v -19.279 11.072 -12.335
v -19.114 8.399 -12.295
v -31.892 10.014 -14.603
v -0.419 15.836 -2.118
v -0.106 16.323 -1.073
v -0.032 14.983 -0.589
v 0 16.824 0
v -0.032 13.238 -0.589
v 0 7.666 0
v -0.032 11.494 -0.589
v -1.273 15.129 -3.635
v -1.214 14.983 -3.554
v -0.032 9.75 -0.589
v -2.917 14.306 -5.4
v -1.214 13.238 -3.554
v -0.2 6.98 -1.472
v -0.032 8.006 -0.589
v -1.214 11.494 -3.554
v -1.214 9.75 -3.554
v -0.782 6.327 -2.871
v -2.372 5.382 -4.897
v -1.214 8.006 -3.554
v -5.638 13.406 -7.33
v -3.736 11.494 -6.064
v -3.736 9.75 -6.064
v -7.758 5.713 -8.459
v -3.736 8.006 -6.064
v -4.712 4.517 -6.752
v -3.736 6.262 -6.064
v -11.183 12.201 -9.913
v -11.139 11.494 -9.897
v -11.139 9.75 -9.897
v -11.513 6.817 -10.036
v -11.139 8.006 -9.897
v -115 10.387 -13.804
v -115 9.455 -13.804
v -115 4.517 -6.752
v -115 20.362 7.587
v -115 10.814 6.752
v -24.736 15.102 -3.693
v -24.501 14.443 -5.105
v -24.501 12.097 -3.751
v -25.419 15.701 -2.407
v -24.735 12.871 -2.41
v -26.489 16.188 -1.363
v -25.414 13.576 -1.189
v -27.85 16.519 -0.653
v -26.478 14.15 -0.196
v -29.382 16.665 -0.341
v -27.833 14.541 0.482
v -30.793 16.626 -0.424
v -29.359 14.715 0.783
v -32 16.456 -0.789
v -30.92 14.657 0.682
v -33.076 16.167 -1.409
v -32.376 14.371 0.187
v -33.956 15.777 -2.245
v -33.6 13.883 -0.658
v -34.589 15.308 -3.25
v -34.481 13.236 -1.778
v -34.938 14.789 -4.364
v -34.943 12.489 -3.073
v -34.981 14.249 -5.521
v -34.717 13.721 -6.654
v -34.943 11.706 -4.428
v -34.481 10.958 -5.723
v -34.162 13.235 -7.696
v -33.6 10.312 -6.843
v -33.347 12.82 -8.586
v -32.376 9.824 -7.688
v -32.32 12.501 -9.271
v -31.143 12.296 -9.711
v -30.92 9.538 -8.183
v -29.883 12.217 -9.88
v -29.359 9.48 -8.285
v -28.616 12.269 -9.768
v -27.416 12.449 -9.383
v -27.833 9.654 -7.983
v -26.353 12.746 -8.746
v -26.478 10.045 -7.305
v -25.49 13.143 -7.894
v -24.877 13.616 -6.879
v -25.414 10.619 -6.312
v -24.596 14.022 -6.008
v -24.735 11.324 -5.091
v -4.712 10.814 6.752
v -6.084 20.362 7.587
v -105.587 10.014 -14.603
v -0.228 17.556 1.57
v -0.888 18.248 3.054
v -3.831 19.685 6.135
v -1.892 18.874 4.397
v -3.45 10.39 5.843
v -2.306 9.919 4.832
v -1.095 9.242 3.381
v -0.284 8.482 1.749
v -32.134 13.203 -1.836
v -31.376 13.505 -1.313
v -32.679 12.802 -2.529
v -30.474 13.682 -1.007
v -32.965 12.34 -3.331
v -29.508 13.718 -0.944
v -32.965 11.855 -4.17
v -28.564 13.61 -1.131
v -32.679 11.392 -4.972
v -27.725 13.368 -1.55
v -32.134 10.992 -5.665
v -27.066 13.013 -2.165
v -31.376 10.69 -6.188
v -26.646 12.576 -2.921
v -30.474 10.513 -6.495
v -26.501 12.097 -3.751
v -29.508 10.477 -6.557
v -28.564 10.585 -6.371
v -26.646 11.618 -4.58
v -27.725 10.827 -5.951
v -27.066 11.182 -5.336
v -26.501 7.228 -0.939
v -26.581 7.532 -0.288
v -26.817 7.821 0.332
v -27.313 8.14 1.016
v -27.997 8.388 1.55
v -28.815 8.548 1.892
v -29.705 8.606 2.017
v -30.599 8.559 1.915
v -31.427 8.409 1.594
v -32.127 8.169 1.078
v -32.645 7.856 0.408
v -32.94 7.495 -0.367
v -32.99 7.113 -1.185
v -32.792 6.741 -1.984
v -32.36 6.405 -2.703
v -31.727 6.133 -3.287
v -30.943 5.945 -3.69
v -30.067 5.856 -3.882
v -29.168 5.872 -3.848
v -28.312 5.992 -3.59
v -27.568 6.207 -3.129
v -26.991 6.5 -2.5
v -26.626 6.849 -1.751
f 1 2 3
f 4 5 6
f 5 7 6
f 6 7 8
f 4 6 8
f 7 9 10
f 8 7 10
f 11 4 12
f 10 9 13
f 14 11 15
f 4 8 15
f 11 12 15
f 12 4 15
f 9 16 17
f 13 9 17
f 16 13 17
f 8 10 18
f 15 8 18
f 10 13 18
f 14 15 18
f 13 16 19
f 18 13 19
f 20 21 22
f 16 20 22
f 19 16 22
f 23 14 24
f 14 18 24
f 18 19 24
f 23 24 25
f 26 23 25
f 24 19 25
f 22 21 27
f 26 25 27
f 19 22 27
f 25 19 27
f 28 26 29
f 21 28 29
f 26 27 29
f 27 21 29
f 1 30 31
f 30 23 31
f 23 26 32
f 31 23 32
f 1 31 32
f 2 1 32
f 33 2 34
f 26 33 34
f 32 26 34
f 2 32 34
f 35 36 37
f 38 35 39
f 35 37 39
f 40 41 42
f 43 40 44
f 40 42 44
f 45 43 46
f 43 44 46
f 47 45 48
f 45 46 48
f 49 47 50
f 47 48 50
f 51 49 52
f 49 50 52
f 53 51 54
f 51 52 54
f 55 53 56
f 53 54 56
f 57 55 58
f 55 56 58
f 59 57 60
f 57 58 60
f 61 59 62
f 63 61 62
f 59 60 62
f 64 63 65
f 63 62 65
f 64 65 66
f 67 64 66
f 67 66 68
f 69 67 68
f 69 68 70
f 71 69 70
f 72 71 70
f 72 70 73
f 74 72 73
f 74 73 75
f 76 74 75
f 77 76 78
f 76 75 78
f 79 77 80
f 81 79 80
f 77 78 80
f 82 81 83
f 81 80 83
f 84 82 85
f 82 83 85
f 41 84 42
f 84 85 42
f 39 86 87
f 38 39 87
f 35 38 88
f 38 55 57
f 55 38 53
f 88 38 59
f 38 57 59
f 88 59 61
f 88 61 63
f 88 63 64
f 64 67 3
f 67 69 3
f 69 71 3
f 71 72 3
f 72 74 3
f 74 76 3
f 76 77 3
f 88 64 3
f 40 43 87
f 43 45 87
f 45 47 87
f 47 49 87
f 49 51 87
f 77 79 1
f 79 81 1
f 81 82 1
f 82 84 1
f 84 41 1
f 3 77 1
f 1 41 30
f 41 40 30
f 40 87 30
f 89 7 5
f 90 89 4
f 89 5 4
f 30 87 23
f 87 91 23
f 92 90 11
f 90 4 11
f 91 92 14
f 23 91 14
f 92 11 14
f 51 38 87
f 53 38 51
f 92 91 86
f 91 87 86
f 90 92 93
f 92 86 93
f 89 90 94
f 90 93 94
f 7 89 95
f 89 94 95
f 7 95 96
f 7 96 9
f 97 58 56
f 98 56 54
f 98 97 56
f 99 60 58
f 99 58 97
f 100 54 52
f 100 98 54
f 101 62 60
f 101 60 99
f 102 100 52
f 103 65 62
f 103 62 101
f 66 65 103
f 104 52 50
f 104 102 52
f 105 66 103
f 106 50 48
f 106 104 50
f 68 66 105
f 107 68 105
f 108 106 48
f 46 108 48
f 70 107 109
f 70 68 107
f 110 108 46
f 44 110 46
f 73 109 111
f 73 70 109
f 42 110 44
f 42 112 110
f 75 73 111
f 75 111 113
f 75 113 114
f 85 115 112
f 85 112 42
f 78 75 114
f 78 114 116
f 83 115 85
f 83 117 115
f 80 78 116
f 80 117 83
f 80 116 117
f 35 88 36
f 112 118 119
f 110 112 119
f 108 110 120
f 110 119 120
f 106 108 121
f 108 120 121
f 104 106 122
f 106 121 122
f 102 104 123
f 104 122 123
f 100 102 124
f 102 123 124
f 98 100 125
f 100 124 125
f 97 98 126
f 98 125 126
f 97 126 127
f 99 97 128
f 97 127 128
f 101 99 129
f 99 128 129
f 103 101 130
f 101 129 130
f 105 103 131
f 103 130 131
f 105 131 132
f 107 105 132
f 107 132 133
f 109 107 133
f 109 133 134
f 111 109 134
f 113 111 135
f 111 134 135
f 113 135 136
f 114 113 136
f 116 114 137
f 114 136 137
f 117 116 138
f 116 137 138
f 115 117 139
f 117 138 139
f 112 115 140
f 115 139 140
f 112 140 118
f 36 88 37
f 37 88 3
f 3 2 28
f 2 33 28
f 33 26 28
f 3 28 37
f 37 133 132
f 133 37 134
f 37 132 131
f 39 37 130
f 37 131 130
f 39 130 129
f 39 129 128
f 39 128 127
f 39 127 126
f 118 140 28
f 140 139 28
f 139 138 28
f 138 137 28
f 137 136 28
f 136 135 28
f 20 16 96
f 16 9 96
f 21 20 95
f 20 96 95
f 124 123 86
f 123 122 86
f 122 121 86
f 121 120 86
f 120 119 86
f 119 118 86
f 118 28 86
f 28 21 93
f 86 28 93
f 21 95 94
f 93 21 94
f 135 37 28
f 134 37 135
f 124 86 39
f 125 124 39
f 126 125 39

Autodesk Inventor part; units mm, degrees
sketch "Sketch5" plane through (0, 0, 0) normal (0, 1, 0) x (-1, 0, 0)
  spline S0 degree 4 poles (214, 0.3449) (213.9235, 0.3586) (213.5504, 0.4255) (212.9247, 0.5375) (211.8694, 0.7251) (210.7617, 0.9209) (209.4043, 1.1592) (207.8102, 1.4368) (205.9789, 1.7525) (203.9169, 2.1042) (201.6282, 2.4897) (199.1185, 2.907) (196.3936, 3.3535) (193.4599, 3.8269) (190.3242, 4.3245) (186.9939, 4.8439) (183.4768, 5.3823) (179.781, 5.937) (175.9152, 6.5054) (171.8885, 7.0847) (167.7102, 7.6721) (163.3902, 8.265) (158.9384, 8.8603) (154.3653, 9.4553) (149.6816, 10.047) (144.8982, 10.6323) (140.0263, 11.2083) (135.0773, 11.7717) (130.0627, 12.3193) (124.9942, 12.8478) (119.8837, 13.3538) (114.7431, 13.8337) (109.5844, 14.2841) (104.4196, 14.7015) (99.2609, 15.0822) (94.1202, 15.4227) (89.0095, 15.7197) (83.9407, 15.9697) (78.9258, 16.1695) (73.9764, 16.3162) (69.104, 16.4071) (64.32, 16.4396) (59.6357, 16.4118) (55.0618, 16.3218) (50.6091, 16.1683) (46.288, 15.9504) (42.1085, 15.6678) (38.0804, 15.3204) (34.213, 14.9088) (30.5154, 14.4338) (26.9962, 13.8969) (23.6634, 13.3) (20.5248, 12.6451) (17.5876, 11.9348) (14.8584, 11.1717) (12.3433, 10.3589) (10.0479, 9.4991) (7.977, 8.5956) (6.1348, 7.651) (4.5247, 6.6676) (3.1496, 5.6471) (2.0123, 4.5896) (1.1163, 3.495) (0.468, 2.3618) (0.0758, 1.1958) (-0.0534, 0) (0.0758, -1.1958) (0.468, -2.3618) (1.1163, -3.495) (2.0123, -4.5896) (3.1496, -5.6471) (4.5247, -6.6676) (6.1348, -7.651) (7.977, -8.5956) (10.0479, -9.4991) (12.3433, -10.3589) (14.8584, -11.1717) (17.5876, -11.9348) (20.5248, -12.6451) (23.6634, -13.3) (26.9962, -13.8969) (30.5154, -14.4338) (34.213, -14.9088) (38.0804, -15.3204) (42.1085, -15.6678) (46.288, -15.9504) (50.6091, -16.1683) (55.0618, -16.3218) (59.6357, -16.4118) (64.32, -16.4396) (69.104, -16.4071) (73.9764, -16.3162) (78.9258, -16.1695) (83.9407, -15.9697) (89.0095, -15.7197) (94.1202, -15.4227) (99.2609, -15.0822) (104.4196, -14.7015) (109.5844, -14.2841) (114.7431, -13.8337) (119.8837, -13.3538) (124.9942, -12.8478) (130.0627, -12.3193) (135.0773, -11.7717) (140.0263, -11.2083) (144.8982, -10.6323) (149.6816, -10.047) (154.3653, -9.4553) (158.9384, -8.8603) (163.3902, -8.265) (167.7102, -7.6721) (171.8885, -7.0847) (175.9152, -6.5054) (179.781, -5.937) (183.4768, -5.3823) (186.9939, -4.8439) (190.3242, -4.3245) (193.4599, -3.8269) (196.3936, -3.3535) (199.1185, -2.907) (201.6282, -2.4897) (203.9169, -2.1042) (205.9789, -1.7525) (207.8102, -1.4368) (209.4043, -1.1592) (210.7617, -0.9209) (211.8694, -0.7251) (212.9247, -0.5375) (213.5504, -0.4255) (213.9235, -0.3586) (214, -0.3449) knots 0 0 0 0 0 0.006275 0.009968 0.014263 0.019074 0.024344 0.030027 0.036088 0.042498 0.04923 0.056263 0.063574 0.071147 0.078961 0.087003 0.095255 0.103702 0.112331 0.121128 0.130079 0.13917 0.148391 0.157726 0.167166 0.176696 0.186306 0.195983 0.205715 0.215491 0.225299 0.235127 0.244964 0.254798 0.264619 0.274414 0.284172 0.293881 0.303532 0.313111 0.322608 0.332012 0.34131 0.350493 0.359549 0.368466 0.377233 0.385838 0.39427 0.402518 0.410569 0.418411 0.426034 0.433424 0.440569 0.447459 0.454083 0.460432 0.466498 0.472281 0.477786 0.483031 0.48805 0.4929 0.497646 0.502354 0.5071 0.51195 0.516969 0.522214 0.527719 0.533502 0.539568 0.545917 0.552541 0.559431 0.566576 0.573966 0.581589 0.589431 0.597482 0.60573 0.614162 0.622767 0.631534 0.640451 0.649507 0.65869 0.667988 0.677392 0.686889 0.696468 0.706119 0.715828 0.725586 0.735381 0.745202 0.755036 0.764873 0.774701 0.784509 0.794285 0.804017 0.813694 0.823304 0.832834 0.842274 0.851609 0.86083 0.869921 0.878872 0.887669 0.896298 0.904745 0.912997 0.921039 0.928853 0.936426 0.943737 0.95077 0.957502 0.963912 0.969973 0.975656 0.980926 0.985737 0.990032 0.993725 1 1 1 1 1
  line L0 (204.525, -2) -> (204.525, 2)
  line L1 (204.525, 0) -> (0, 0)
  line L2 (0, 0) -> (61.2, 0)
  line L3 (61.2, 0) -> (61.2, -16.415)
  line L4 (61.2, -16.415) -> (61.2, 16.415)
  point P0 (0, 0)
  point P1 (213.875, 0.3673)
  point P2 (213.5005, 0.4344)
  point P3 (212.8772, 0.5457)
  point P4 (212.0066, 0.7006)
  point P5 (210.8908, 0.8979)
  point P6 (209.5323, 1.1364)
  point P7 (207.9344, 1.4146)
  point P8 (206.1007, 1.7309)
  point P9 (204.0356, 2.0831)
  point P10 (201.7438, 2.4693)
  point P11 (199.2308, 2.8872)
  point P12 (196.5023, 3.3344)
  point P13 (193.5648, 3.8084)
  point P14 (190.4252, 4.3068)
  point P15 (187.0907, 4.8269)
  point P16 (183.5691, 5.366)
  point P17 (179.8687, 5.9215)
  point P18 (175.9981, 6.4907)
  point P19 (171.9664, 7.0708)
  point P20 (167.7829, 7.6591)
  point P21 (163.4575, 8.2526)
  point P22 (159.0002, 8.8488)
  point P23 (154.4215, 9.4444)
  point P24 (149.732, 10.0368)
  point P25 (144.9427, 10.6228)
  point P26 (140.0648, 11.1993)
  point P27 (135.1097, 11.7633)
  point P28 (130.0889, 12.3114)
  point P29 (125.0142, 12.8402)
  point P30 (119.8974, 13.3464)
  point P31 (114.7505, 13.8266)
  point P32 (109.5855, 14.2771)
  point P33 (104.4145, 14.6943)
  point P34 (99.2495, 15.0749)
  point P35 (94.1026, 15.4151)
  point P36 (88.9858, 15.7116)
  point P37 (83.9111, 15.961)
  point P38 (78.8903, 16.1601)
  point P39 (73.9352, 16.306)
  point P40 (69.0573, 16.3958)
  point P41 (64.268, 16.4271)
  point P42 (59.5785, 16.3978)
  point P43 (54.9998, 16.3062)
  point P44 (50.5425, 16.1509)
  point P45 (46.2171, 15.931)
  point P46 (42.0336, 15.6461)
  point P47 (38.0019, 15.2962)
  point P48 (34.1313, 14.8818)
  point P49 (30.4309, 14.4038)
  point P50 (26.9093, 13.8636)
  point P51 (23.5748, 13.2629)
  point P52 (20.4352, 12.6039)
  point P53 (17.4977, 11.889)
  point P54 (14.7693, 11.1209)
  point P55 (12.2562, 10.3027)
  point P56 (9.9644, 9.4372)
  point P57 (7.8993, 8.5276)
  point P58 (6.0656, 7.5769)
  point P59 (4.4677, 6.5883)
  point P60 (3.1092, 5.5644)
  point P61 (1.9934, 4.5081)
  point P62 (1.1228, 3.4216)
  point P63 (0.4995, 2.307)
  point P64 (0.125, 1.1661)
  point P65 (0.125, -1.1661)
  point P66 (0.4995, -2.307)
  point P67 (1.1228, -3.4216)
  point P68 (1.9934, -4.5081)
  point P69 (3.1092, -5.5644)
  point P70 (4.4677, -6.5883)
  point P71 (6.0656, -7.5769)
  point P72 (7.8993, -8.5276)
  point P73 (9.9644, -9.4372)
  point P74 (12.2562, -10.3027)
  point P75 (14.7693, -11.1209)
  point P76 (17.4977, -11.889)
  point P77 (20.4352, -12.6039)
  point P78 (23.5748, -13.2629)
  point P79 (26.9093, -13.8636)
  point P80 (30.4309, -14.4038)
  point P81 (34.1313, -14.8818)
  point P82 (38.0019, -15.2962)
  point P83 (42.0336, -15.6461)
  point P84 (46.2171, -15.931)
  point P85 (50.5425, -16.1509)
  point P86 (54.9998, -16.3062)
  point P87 (59.5785, -16.3978)
  point P88 (64.268, -16.4271)
  point P89 (69.0573, -16.3958)
  point P90 (73.9352, -16.306)
  point P91 (78.8903, -16.1601)
  point P92 (83.9111, -15.961)
  point P93 (88.9858, -15.7116)
  point P94 (94.1026, -15.4151)
  point P95 (99.2495, -15.0749)
  point P96 (104.4145, -14.6943)
  point P97 (109.5855, -14.2771)
  point P98 (114.7505, -13.8266)
  point P99 (119.8974, -13.3464)
  point P100 (125.0142, -12.8402)
  point P101 (130.0889, -12.3114)
  point P102 (135.1097, -11.7633)
  point P103 (140.0648, -11.1993)
  point P104 (144.9427, -10.6228)
  point P105 (149.732, -10.0368)
  point P106 (154.4215, -9.4444)
  point P107 (159.0002, -8.8488)
  point P108 (163.4575, -8.2526)
  point P109 (167.7829, -7.6591)
  point P110 (171.9664, -7.0708)
  point P111 (175.9981, -6.4907)
  point P112 (179.8687, -5.9215)
  point P113 (183.5691, -5.366)
  point P114 (187.0907, -4.8269)
  point P115 (190.4252, -4.3068)
  point P116 (193.5648, -3.8084)
  point P117 (196.5023, -3.3344)
  point P118 (199.2308, -2.8872)
  point P119 (201.7438, -2.4693)
  point P120 (204.0356, -2.0831)
  point P121 (206.1007, -1.7309)
  point P122 (207.9344, -1.4146)
  point P123 (209.5323, -1.1364)
  point P124 (210.8908, -0.8979)
  point P125 (212.0066, -0.7006)
  point P126 (212.8772, -0.5457)
  point P127 (213.5005, -0.4344)
  point P128 (213.875, -0.3673)
  dimension "d28" = 204.525
  dimension "d29" = 61.2
  dimension "d30" = 32.8299
extrude "Main Wing" add sketch "Sketch5" along normal blind 453.491
sketch "Sketch6" plane through (-204.525, 0, 2) normal (-1, 0, 0) x (0, 0, 1)
  line L0 (0, 0) -> (0, 66.548)
  line L1 (0, 453.4889) -> (0, 366.5701)
  line L2 (20, 366.5701) -> (-20, 366.5701)
  line L3 (-20, 66.548) -> (20, 66.548)
  line L4 (20, 66.548) -> (20, 366.5701)
  line L5 (-20, 366.5701) -> (-20, 66.548)
  point P0 (-2, 0)
  dimension "d31" = 66.548
  dimension "d32" = 86.9188
  dimension "d33" = 40
  dimension "d34" = 40
  dimension "d43" = 300.0221
extrude "Rectangle Elevron Gap" cut sketch "Sketch6" against normal blind 69.6214
sketch "Sketch7" plane through (-204.525, 66.548, 2) normal (0, 1, 0) x (1, 0, 0)
  line L0 (69.6201, 13.7865) -> (69.6201, -9.7851)
  line L1 (69.6201, -9.7851) -> (69.6201, 2.0009)
  circle A0 centre (69.6201, 2.0009) radius 17
  circle A1 centre (69.6201, 2.0009) radius 1.7526
  point P0 (204.525, 2)
  point P1 (69.6201, 3.7535)
  point P2 (69.6201, 0.2483)
  dimension "d37" = 23.5717
  dimension "d38" = 11.786
  dimension "d41" = 34
  dimension "d42" = 3.5052
extrude "Circle Elevron Gap" cut sketch "Sketch7" along normal blind 300.0221 contours A1 L0 | A0 picked at (69.7501, 0.8471)
sketch "Sketch8" plane through (0, 453.491, 0) normal (0, 1, 0) x (1, 0, 0)
  line L0 (-204.5238, 0) -> (-143.0304, 0)
  circle A0 centre (-143.0304, 0) radius 1.7526
  point P0 (0, 0)
  dimension "d46" = 61.4934
  dimension "d47" = 3.5052
extrude "Elevron Screw Hole" cut sketch "Sketch8" against normal blind 454.0221
ref_plane "Leading Edge Plane" through (0, 226.7455, 0) normal (-1, 0, 0) x (0, 0, 1)
sketch "Sketch9" plane through (0, 226.7455, 0) normal (-1, 0, 0) x (0, 0, 1)
  line L0 (0, -226.7455) -> (0, 226.7401)
  line L1 (0, 226.7401) -> (0, 213.1781)
  line L2 (0, 213.1781) -> (0, 194.4281)
  circle A0 centre (0, 194.4281) radius 18.75
  line L3 (-14.0018, 198.1799) -> (3.7518, 208.4299)
  line L4 (3.7518, 208.4299) -> (14.0018, 190.6764)
  line L5 (14.0018, 190.6764) -> (-3.7518, 180.4264)
  line L6 (-3.7518, 180.4264) -> (-14.0018, 198.1799)
  line L7 (-14.0018, 198.1799) -> (14.0018, 190.6764) construction
  line L8 (3.7518, 208.4299) -> (-3.7518, 180.4264) construction
  circle A1 centre (0, 194.4281) radius 15.5
  dimension "d50" = 13.562
  dimension "d51" = 18.75
  dimension "d52" = 37.5
  dimension "d55" = 20.5
  dimension "d56" = 20.5
  dimension "d70" = 31
extrude "Circle thingy for boom" add sketch "Sketch9" along normal blind 204.5 contours A1 L0 L3 L6 L5 | L0 L5 L4 L3 A1 | L5 L6 L3 L0 | L0 L3 L4 L5
sketch "Sketch10" plane through (0, 226.7455, 0) normal (1, 0, 0) x (0, 0, -1)
  line L0 (0, 213.1791) -> (0, 194.4291)
  line L1 (13.6215, 199.3869) -> (-4.9578, 208.0506)
  line L2 (-4.9578, 208.0506) -> (-13.6215, 189.4713)
  line L3 (-13.6215, 189.4713) -> (4.9578, 180.8076)
  line L4 (4.9578, 180.8076) -> (13.6215, 199.3869)
  line L5 (13.6215, 199.3869) -> (-13.6215, 189.4713) construction
  line L6 (-4.9578, 208.0506) -> (4.9578, 180.8076) construction
  point P0 (0, -226.7455)
  dimension "d57" = 18.75
  dimension "d58" = 20.5
  dimension "d59" = 20.5
extrude "20x20 hole for boom" cut sketch "Sketch10" against normal blind 205.5
ref_plane "Plane of Pain" through (-204.525, 0, -17) normal (0, 0, 1) x (0, 1, 0)
ref_plane "Work Plane5" through (-204.525, 0, -2) normal (0, 0, 1) x (0, 1, 0)
sketch "Sketch11" plane through (-204.525, 0, -17) normal (0, 0, 1) x (0, 1, 0)
  line L0 (453.4842, 0.0013) -> (403.4842, 0.0013)
  line L1 (403.4842, 0.0013) -> (404.7122, -149.9936)
  circle A0 centre (404.7122, -149.9936) radius 5.25
  line L2 (404.7122, -149.9936) -> (219.7122, -149.9936)
  circle A1 centre (219.7122, -149.9936) radius 5.25
  line L3 (366.5707, -80.63) -> (219.7122, -80.63)
  line L4 (219.7122, -80.63) -> (219.7122, -149.9936)
  point P0 (0, -204.525)
  dimension "d64" = 50
  dimension "d65" = 150
  dimension "d66" = 10.5
  dimension "d67" = 185
  dimension "d121" = 146.8585
  dimension "d122" = 69.3637
ref_plane "20x20 Plane" through (0, 416.8428, -9.2897) normal (0, 0.4226183, 0.9063078) x (1, 0, 0)
sketch "Sketch12" plane through (0, 416.8428, -9.2897) normal (0, 0.4226183, 0.9063078) x (1, 0, 0)
  line L0 (0, 10.2503) -> (0, 0.0003)
  line L1 (0, 0.0003) -> (-55, 0.0003)
  circle A0 centre (-55, 0.0003) radius 5.25
  circle A1 centre (-55, 0.0003) radius 2.75
  point P0 (0, -381.7138)
  dimension "d71" = 10.25
  dimension "d72" = 55
  dimension "d73" = 10.5
  dimension "d74" = 5.5
sketch "Sketch13" plane through (0, 416.8428, -9.2897) normal (0, 0.4226183, 0.9063078) x (1, 0, 0)
  circle A0 centre (-55, 0) radius 5.25
  circle A1 centre (-55, 0) radius 2.75
  point P0 (0, -381.7138)
  dimension "d77" = 10.5
  dimension "d82" = 5.5
extrude "Boom Screw Head" cut sketch "Sketch13" against normal blind 13.75 contours A0 | A1
extrude "Boom Screw Hole" add sketch "Sketch12" against normal blind 3
sketch "Sketch14" plane through (-204.525, 366.5701, -2) normal (0, -1, 0) x (1, 0, 0)
  line L0 (61.5404, 3.7631) -> (61.5404, 7.2141)
  line L1 (61.5404, 7.2141) -> (43.5474, 7.2141)
  line L2 (61.5404, 7.2141) -> (69.3184, 7.2141)
  line L3 (43.5474, 7.2141) -> (43.5474, -10.2859)
  line L4 (69.3184, 7.2141) -> (69.3184, -10.2859)
  line L5 (43.5474, -10.2859) -> (69.3184, -10.2859)
  point P0 (204.525, 2)
  dimension "d89" = 3.451
  dimension "d90" = 17.993
  dimension "d91" = 7.778
  dimension "d93" = 17.5
  dimension "d94" = 17.5
extrude "Servo Hole" cut sketch "Sketch14" against normal blind 28.763
sketch "Sketch15" plane through (-135.2066, 366.5701, -11.7525) normal (-1, 0, 0) x (0, 0, 1)
  line L0 (17, 0) -> (17, 6)
  line L1 (17, 6) -> (17, 8)
  line L2 (17, 8) -> (-3, 8)
  line L3 (-3, 8) -> (-3, 6)
  line L4 (-3, 6) -> (17, 6)
  point P0 (11.7525, -366.5701)
  dimension "d97" = 6
  dimension "d98" = 2
  dimension "d99" = 2
extrude "Servo Sidewall 1" cut sketch "Sketch15" against normal blind 2.782
sketch "Sketch16" plane through (-160.9776, 366.5701, 5.2141) normal (1, 0, 0) x (0, 0, -1)
  line L0 (0, 0) -> (0, 6)
  line L1 (0, 6) -> (0, 8)
  line L2 (0, 8) -> (14, 8)
  line L3 (14, 8) -> (14, 6)
  line L4 (14, 6) -> (0, 6)
  point P0 (5.2141, -366.5701)
  dimension "d102" = 6
  dimension "d103" = 2
extrude "Servo Sidewall 2" cut sketch "Sketch16" against normal blind 2.782
sketch "Sketch17" plane through (-135.2066, 366.5701, 5.2141) normal (0, 0, -1) x (-1, 0, 0)
  line L0 (0, 8) -> (0, 16.3)
  line L1 (0, 28.7478) -> (0, 23.2698)
  line L2 (0, 16.3) -> (-27.1565, 48.6638)
  line L3 (0, 23.2698) -> (-27.1565, 55.6336)
  line L4 (-27.1565, 48.6638) -> (-27.1565, 55.6336)
  line L5 (0, 23.2698) -> (0, 16.3)
  point P0 (-135.2066, -366.5701)
  point P1 (0, 23.2698)
  dimension "d106" = 8.3
  dimension "d107" = 5.478
  dimension "d108" = 42.248
  dimension "d109" = 42.248
extrude "some slant hole" cut sketch "Sketch17" along normal blind 23.75
fillet "Fillet for slant" radius 7.7 2 edges at (-135.2066, 382.8701, -3.2692) (-135.2066, 389.8399, -3.2692)
sketch "Sketch18" plane through (-204.525, 0, -17) normal (0, 0, 1) x (0, 1, 0)
  circle A0 centre (219.7124, -149.9979) radius 3.25
  point P0 (0, -204.525)
  dimension "d113" = 6.5
extrude "Screwhead for something" cut sketch "Sketch11" along normal blind 5.25 contours A1 L4 L2 | L2 L4 A1
extrude "screwhole for thingy" cut sketch "Sketch18" along normal blind 41.75
ref_plane "Work Plane10" through (-182.7513, 87.2769, 166.4641) normal (0, 0.8660254, -0.5) x (1, 0, 0)
ref_plane "Work Plane9" through (-182.7513, 366.5701, 5.2141) normal (0, 0.8660254, -0.5) x (1, 0, 0)
sketch "Sketch20" plane through (-182.7513, 87.2769, 166.4641) normal (0, 0.8660254, -0.5) x (1, 0, 0)
  circle A0 centre (138, 200) radius 2.8284
  point P0 (182.7513, 187.8006)
ref_plane "Bottom of Airfoil" through (-204.525, 0, 16.5) normal (0, 0, 1) x (0, 1, 0)
sketch "Sketch21" plane through (-204.525, 0, 16.5) normal (0, 0, 1) x (0, 1, 0)
  line L0 (366.5707, -80.6294) -> (219.7127, -80.6294)
  line L1 (219.7127, -80.6294) -> (219.7127, -149.9934)
  line L2 (219.7127, -149.9934) -> (214.6627, -149.9934)
  line L3 (214.6627, -147.0779) -> (214.6627, -152.9089)
  line L4 (214.6627, -147.0779) -> (219.7125, -144.1624)
  line L5 (219.7125, -144.1624) -> (224.7623, -147.0779)
  line L6 (224.7623, -147.0779) -> (224.7623, -152.9089)
  line L7 (224.7623, -152.9089) -> (219.7125, -155.8244)
  line L8 (214.6627, -152.9089) -> (219.7125, -155.8244)
  point P0 (0, -204.525)
  point P1 (224.7623, -147.0779)
  dimension "d123" = 146.858
  dimension "d124" = 69.364
  dimension "d125" = 5.05
  dimension "d126" = 5.831
  dimension "d127" = 5.831
  dimension "d128" = 5.831
  dimension "d129" = 5.831
  dimension "d130" = 5.831
extrude "Hexagon Hole of Doom" cut sketch "Sketch21" against normal blind 4
sketch "Sketch22" plane through (-182.7513, 87.2769, 166.4641) normal (0, 0.8660254, -0.5) x (1, 0, 0)
  line L0 (138, 200) -> (153, 200)
  line L1 (153, 200) -> (153, 185)
  circle A0 centre (153, 185) radius 5.25
  line L2 (153, 185) -> (61.5, 185)
  circle A1 centre (61.5, 185) radius 5.25
  point P0 (182.7513, 187.8006)
  dimension "d137" = 15
  dimension "d138" = 15
  dimension "d139" = 10.5
  dimension "d140" = 91.5
  dimension "d141" = 10.5
extrude "Extrusion23" cut sketch "Sketch22" along normal blind 68.25
sketch "Sketch23" plane through (-182.7513, 87.2769, 166.4641) normal (0, 0.8660254, -0.5) x (1, 0, 0)
  line L0 (138, 200) -> (153, 200)
  line L1 (153, 200) -> (153, 185)
  line L2 (153, 185) -> (61.5, 185)
  circle A0 centre (153, 185) radius 5.25
  circle A1 centre (153, 185) radius 3.25
  circle A2 centre (61.5, 185) radius 5.25
  circle A3 centre (61.5, 185) radius 3.25
  point P0 (182.7513, 187.8006)
  dimension "d144" = 15
  dimension "d145" = 15
  dimension "d146" = 91.5
  dimension "d147" = 10.5
  dimension "d148" = 6.5
  dimension "d149" = 10.5
  dimension "d150" = 6.5
extrude "Extrusion24" add sketch "Sketch23" along normal blind 20 contours A0 L2 A1 L1 | L1 A1 L2 A0 | A2
sketch "Sketch24" plane through (0, 0, 0) normal (0, -1, 0) x (1, 0, 0)
  line L0 (0, -15) -> (-205, -15)
  line L1 (-205, -15) -> (-205, 16)
  line L2 (-205, 16) -> (0, 16)
  line L3 (0, 16) -> (0, -15)
  point P0 (0, 0)
extrude "Extrusion25" cut sketch "Sketch24" along normal blind 8.75
sketch "Sketch25" plane through (0, 226.7455, 0) normal (-1, 0, 0) x (0, 0, 1)
  line L0 (-16.4393, -226.7455) -> (20.5607, -226.7455) construction
  line L1 (17.0941, -211.1086) -> (17.0941, -226.7455)
  line L2 (17.0941, -226.7455) -> (-16.4393, -226.7455)
  line L3 (-16.4393, -226.7455) -> (36.2607, -226.7455) construction
  line L4 (-16.4393, -226.7455) -> (17.4356, -226.7455)
  line L5 (0, -226.7455) -> (0, -219.0797)
  line L6 (17.0941, -201.9506) -> (17.0941, -211.1086)
  line L7 (-36.0788, -226.7455) -> (-16.4393, -226.7455)
  line L8 (-6.752, -213.0525) -> (6.5452, -213.0525) construction
  line L9 (-6.752, -222.2282) -> (6.752, -215.9312)
  line L10 (6.752, -215.9312) -> (7.5873, -206.3837)
  line L11 (7.5873, -206.3837) -> (-14.6028, -216.7311)
  line L12 (-14.6028, -216.7311) -> (-6.752, -222.2282)
  line L13 (-16.4393, -226.7455) -> (17.0941, -211.1086)
  line L14 (17.0941, -226.7455) -> (-16.4393, -226.7455)
  line L15 (-16.4393, -226.7455) -> (-16.4393, 228)
  line L16 (-16.4393, 228) -> (17.0941, 228)
  line L17 (17.0941, 228) -> (17.0941, -226.7455)
  dimension "d155" = 37
  dimension "d220" = 14.9
  dimension "d221" = 60
  dimension "d222" = 60
  dimension "d223" = 8.3
ref_plane "Work Plane14" through (0, 366.491, 0) normal (0, 1, 0) x (1, 0, 0)
ref_plane "Work Plane15" through (-168.2987, 4.1455, -7.5873) normal (0, -0.9063078, 0.4226183) x (1, 0, 0)
extrude "Extrusion36" cut sketch "Sketch25" along normal blind 236.5 contours L13 L10 L11 L12 L15 L16 L17 L6 | L1 L2 L5 L9 L13 | L2 L13 L9 L5
sketch "Sketch35" plane through (-174.1935, 4.5173, -6.752) normal (0, -0.9063078, 0.4226183) x (1, 0, 0)
  line L0 (174.1935, 4.2103) -> (59.1935, 4.2103)
  line L1 (59.1935, 4.2103) -> (59.1935, 22)
  line L2 (59.1935, 22) -> (-35, 22)
  line L3 (-35, 22) -> (-35, -11)
  line L4 (-35, -11) -> (59.1935, -11)
  line L5 (59.1935, -11) -> (59.1935, 4.2103)
  dimension "d226" = 115
extrude "Extrusion37" cut sketch "Sketch35" against normal blind 236.5
ref_plane "Work Plane8" through (0, 0, 0) normal (0, -1, 0) x (1, 0, 0)
properties part number "connector"
